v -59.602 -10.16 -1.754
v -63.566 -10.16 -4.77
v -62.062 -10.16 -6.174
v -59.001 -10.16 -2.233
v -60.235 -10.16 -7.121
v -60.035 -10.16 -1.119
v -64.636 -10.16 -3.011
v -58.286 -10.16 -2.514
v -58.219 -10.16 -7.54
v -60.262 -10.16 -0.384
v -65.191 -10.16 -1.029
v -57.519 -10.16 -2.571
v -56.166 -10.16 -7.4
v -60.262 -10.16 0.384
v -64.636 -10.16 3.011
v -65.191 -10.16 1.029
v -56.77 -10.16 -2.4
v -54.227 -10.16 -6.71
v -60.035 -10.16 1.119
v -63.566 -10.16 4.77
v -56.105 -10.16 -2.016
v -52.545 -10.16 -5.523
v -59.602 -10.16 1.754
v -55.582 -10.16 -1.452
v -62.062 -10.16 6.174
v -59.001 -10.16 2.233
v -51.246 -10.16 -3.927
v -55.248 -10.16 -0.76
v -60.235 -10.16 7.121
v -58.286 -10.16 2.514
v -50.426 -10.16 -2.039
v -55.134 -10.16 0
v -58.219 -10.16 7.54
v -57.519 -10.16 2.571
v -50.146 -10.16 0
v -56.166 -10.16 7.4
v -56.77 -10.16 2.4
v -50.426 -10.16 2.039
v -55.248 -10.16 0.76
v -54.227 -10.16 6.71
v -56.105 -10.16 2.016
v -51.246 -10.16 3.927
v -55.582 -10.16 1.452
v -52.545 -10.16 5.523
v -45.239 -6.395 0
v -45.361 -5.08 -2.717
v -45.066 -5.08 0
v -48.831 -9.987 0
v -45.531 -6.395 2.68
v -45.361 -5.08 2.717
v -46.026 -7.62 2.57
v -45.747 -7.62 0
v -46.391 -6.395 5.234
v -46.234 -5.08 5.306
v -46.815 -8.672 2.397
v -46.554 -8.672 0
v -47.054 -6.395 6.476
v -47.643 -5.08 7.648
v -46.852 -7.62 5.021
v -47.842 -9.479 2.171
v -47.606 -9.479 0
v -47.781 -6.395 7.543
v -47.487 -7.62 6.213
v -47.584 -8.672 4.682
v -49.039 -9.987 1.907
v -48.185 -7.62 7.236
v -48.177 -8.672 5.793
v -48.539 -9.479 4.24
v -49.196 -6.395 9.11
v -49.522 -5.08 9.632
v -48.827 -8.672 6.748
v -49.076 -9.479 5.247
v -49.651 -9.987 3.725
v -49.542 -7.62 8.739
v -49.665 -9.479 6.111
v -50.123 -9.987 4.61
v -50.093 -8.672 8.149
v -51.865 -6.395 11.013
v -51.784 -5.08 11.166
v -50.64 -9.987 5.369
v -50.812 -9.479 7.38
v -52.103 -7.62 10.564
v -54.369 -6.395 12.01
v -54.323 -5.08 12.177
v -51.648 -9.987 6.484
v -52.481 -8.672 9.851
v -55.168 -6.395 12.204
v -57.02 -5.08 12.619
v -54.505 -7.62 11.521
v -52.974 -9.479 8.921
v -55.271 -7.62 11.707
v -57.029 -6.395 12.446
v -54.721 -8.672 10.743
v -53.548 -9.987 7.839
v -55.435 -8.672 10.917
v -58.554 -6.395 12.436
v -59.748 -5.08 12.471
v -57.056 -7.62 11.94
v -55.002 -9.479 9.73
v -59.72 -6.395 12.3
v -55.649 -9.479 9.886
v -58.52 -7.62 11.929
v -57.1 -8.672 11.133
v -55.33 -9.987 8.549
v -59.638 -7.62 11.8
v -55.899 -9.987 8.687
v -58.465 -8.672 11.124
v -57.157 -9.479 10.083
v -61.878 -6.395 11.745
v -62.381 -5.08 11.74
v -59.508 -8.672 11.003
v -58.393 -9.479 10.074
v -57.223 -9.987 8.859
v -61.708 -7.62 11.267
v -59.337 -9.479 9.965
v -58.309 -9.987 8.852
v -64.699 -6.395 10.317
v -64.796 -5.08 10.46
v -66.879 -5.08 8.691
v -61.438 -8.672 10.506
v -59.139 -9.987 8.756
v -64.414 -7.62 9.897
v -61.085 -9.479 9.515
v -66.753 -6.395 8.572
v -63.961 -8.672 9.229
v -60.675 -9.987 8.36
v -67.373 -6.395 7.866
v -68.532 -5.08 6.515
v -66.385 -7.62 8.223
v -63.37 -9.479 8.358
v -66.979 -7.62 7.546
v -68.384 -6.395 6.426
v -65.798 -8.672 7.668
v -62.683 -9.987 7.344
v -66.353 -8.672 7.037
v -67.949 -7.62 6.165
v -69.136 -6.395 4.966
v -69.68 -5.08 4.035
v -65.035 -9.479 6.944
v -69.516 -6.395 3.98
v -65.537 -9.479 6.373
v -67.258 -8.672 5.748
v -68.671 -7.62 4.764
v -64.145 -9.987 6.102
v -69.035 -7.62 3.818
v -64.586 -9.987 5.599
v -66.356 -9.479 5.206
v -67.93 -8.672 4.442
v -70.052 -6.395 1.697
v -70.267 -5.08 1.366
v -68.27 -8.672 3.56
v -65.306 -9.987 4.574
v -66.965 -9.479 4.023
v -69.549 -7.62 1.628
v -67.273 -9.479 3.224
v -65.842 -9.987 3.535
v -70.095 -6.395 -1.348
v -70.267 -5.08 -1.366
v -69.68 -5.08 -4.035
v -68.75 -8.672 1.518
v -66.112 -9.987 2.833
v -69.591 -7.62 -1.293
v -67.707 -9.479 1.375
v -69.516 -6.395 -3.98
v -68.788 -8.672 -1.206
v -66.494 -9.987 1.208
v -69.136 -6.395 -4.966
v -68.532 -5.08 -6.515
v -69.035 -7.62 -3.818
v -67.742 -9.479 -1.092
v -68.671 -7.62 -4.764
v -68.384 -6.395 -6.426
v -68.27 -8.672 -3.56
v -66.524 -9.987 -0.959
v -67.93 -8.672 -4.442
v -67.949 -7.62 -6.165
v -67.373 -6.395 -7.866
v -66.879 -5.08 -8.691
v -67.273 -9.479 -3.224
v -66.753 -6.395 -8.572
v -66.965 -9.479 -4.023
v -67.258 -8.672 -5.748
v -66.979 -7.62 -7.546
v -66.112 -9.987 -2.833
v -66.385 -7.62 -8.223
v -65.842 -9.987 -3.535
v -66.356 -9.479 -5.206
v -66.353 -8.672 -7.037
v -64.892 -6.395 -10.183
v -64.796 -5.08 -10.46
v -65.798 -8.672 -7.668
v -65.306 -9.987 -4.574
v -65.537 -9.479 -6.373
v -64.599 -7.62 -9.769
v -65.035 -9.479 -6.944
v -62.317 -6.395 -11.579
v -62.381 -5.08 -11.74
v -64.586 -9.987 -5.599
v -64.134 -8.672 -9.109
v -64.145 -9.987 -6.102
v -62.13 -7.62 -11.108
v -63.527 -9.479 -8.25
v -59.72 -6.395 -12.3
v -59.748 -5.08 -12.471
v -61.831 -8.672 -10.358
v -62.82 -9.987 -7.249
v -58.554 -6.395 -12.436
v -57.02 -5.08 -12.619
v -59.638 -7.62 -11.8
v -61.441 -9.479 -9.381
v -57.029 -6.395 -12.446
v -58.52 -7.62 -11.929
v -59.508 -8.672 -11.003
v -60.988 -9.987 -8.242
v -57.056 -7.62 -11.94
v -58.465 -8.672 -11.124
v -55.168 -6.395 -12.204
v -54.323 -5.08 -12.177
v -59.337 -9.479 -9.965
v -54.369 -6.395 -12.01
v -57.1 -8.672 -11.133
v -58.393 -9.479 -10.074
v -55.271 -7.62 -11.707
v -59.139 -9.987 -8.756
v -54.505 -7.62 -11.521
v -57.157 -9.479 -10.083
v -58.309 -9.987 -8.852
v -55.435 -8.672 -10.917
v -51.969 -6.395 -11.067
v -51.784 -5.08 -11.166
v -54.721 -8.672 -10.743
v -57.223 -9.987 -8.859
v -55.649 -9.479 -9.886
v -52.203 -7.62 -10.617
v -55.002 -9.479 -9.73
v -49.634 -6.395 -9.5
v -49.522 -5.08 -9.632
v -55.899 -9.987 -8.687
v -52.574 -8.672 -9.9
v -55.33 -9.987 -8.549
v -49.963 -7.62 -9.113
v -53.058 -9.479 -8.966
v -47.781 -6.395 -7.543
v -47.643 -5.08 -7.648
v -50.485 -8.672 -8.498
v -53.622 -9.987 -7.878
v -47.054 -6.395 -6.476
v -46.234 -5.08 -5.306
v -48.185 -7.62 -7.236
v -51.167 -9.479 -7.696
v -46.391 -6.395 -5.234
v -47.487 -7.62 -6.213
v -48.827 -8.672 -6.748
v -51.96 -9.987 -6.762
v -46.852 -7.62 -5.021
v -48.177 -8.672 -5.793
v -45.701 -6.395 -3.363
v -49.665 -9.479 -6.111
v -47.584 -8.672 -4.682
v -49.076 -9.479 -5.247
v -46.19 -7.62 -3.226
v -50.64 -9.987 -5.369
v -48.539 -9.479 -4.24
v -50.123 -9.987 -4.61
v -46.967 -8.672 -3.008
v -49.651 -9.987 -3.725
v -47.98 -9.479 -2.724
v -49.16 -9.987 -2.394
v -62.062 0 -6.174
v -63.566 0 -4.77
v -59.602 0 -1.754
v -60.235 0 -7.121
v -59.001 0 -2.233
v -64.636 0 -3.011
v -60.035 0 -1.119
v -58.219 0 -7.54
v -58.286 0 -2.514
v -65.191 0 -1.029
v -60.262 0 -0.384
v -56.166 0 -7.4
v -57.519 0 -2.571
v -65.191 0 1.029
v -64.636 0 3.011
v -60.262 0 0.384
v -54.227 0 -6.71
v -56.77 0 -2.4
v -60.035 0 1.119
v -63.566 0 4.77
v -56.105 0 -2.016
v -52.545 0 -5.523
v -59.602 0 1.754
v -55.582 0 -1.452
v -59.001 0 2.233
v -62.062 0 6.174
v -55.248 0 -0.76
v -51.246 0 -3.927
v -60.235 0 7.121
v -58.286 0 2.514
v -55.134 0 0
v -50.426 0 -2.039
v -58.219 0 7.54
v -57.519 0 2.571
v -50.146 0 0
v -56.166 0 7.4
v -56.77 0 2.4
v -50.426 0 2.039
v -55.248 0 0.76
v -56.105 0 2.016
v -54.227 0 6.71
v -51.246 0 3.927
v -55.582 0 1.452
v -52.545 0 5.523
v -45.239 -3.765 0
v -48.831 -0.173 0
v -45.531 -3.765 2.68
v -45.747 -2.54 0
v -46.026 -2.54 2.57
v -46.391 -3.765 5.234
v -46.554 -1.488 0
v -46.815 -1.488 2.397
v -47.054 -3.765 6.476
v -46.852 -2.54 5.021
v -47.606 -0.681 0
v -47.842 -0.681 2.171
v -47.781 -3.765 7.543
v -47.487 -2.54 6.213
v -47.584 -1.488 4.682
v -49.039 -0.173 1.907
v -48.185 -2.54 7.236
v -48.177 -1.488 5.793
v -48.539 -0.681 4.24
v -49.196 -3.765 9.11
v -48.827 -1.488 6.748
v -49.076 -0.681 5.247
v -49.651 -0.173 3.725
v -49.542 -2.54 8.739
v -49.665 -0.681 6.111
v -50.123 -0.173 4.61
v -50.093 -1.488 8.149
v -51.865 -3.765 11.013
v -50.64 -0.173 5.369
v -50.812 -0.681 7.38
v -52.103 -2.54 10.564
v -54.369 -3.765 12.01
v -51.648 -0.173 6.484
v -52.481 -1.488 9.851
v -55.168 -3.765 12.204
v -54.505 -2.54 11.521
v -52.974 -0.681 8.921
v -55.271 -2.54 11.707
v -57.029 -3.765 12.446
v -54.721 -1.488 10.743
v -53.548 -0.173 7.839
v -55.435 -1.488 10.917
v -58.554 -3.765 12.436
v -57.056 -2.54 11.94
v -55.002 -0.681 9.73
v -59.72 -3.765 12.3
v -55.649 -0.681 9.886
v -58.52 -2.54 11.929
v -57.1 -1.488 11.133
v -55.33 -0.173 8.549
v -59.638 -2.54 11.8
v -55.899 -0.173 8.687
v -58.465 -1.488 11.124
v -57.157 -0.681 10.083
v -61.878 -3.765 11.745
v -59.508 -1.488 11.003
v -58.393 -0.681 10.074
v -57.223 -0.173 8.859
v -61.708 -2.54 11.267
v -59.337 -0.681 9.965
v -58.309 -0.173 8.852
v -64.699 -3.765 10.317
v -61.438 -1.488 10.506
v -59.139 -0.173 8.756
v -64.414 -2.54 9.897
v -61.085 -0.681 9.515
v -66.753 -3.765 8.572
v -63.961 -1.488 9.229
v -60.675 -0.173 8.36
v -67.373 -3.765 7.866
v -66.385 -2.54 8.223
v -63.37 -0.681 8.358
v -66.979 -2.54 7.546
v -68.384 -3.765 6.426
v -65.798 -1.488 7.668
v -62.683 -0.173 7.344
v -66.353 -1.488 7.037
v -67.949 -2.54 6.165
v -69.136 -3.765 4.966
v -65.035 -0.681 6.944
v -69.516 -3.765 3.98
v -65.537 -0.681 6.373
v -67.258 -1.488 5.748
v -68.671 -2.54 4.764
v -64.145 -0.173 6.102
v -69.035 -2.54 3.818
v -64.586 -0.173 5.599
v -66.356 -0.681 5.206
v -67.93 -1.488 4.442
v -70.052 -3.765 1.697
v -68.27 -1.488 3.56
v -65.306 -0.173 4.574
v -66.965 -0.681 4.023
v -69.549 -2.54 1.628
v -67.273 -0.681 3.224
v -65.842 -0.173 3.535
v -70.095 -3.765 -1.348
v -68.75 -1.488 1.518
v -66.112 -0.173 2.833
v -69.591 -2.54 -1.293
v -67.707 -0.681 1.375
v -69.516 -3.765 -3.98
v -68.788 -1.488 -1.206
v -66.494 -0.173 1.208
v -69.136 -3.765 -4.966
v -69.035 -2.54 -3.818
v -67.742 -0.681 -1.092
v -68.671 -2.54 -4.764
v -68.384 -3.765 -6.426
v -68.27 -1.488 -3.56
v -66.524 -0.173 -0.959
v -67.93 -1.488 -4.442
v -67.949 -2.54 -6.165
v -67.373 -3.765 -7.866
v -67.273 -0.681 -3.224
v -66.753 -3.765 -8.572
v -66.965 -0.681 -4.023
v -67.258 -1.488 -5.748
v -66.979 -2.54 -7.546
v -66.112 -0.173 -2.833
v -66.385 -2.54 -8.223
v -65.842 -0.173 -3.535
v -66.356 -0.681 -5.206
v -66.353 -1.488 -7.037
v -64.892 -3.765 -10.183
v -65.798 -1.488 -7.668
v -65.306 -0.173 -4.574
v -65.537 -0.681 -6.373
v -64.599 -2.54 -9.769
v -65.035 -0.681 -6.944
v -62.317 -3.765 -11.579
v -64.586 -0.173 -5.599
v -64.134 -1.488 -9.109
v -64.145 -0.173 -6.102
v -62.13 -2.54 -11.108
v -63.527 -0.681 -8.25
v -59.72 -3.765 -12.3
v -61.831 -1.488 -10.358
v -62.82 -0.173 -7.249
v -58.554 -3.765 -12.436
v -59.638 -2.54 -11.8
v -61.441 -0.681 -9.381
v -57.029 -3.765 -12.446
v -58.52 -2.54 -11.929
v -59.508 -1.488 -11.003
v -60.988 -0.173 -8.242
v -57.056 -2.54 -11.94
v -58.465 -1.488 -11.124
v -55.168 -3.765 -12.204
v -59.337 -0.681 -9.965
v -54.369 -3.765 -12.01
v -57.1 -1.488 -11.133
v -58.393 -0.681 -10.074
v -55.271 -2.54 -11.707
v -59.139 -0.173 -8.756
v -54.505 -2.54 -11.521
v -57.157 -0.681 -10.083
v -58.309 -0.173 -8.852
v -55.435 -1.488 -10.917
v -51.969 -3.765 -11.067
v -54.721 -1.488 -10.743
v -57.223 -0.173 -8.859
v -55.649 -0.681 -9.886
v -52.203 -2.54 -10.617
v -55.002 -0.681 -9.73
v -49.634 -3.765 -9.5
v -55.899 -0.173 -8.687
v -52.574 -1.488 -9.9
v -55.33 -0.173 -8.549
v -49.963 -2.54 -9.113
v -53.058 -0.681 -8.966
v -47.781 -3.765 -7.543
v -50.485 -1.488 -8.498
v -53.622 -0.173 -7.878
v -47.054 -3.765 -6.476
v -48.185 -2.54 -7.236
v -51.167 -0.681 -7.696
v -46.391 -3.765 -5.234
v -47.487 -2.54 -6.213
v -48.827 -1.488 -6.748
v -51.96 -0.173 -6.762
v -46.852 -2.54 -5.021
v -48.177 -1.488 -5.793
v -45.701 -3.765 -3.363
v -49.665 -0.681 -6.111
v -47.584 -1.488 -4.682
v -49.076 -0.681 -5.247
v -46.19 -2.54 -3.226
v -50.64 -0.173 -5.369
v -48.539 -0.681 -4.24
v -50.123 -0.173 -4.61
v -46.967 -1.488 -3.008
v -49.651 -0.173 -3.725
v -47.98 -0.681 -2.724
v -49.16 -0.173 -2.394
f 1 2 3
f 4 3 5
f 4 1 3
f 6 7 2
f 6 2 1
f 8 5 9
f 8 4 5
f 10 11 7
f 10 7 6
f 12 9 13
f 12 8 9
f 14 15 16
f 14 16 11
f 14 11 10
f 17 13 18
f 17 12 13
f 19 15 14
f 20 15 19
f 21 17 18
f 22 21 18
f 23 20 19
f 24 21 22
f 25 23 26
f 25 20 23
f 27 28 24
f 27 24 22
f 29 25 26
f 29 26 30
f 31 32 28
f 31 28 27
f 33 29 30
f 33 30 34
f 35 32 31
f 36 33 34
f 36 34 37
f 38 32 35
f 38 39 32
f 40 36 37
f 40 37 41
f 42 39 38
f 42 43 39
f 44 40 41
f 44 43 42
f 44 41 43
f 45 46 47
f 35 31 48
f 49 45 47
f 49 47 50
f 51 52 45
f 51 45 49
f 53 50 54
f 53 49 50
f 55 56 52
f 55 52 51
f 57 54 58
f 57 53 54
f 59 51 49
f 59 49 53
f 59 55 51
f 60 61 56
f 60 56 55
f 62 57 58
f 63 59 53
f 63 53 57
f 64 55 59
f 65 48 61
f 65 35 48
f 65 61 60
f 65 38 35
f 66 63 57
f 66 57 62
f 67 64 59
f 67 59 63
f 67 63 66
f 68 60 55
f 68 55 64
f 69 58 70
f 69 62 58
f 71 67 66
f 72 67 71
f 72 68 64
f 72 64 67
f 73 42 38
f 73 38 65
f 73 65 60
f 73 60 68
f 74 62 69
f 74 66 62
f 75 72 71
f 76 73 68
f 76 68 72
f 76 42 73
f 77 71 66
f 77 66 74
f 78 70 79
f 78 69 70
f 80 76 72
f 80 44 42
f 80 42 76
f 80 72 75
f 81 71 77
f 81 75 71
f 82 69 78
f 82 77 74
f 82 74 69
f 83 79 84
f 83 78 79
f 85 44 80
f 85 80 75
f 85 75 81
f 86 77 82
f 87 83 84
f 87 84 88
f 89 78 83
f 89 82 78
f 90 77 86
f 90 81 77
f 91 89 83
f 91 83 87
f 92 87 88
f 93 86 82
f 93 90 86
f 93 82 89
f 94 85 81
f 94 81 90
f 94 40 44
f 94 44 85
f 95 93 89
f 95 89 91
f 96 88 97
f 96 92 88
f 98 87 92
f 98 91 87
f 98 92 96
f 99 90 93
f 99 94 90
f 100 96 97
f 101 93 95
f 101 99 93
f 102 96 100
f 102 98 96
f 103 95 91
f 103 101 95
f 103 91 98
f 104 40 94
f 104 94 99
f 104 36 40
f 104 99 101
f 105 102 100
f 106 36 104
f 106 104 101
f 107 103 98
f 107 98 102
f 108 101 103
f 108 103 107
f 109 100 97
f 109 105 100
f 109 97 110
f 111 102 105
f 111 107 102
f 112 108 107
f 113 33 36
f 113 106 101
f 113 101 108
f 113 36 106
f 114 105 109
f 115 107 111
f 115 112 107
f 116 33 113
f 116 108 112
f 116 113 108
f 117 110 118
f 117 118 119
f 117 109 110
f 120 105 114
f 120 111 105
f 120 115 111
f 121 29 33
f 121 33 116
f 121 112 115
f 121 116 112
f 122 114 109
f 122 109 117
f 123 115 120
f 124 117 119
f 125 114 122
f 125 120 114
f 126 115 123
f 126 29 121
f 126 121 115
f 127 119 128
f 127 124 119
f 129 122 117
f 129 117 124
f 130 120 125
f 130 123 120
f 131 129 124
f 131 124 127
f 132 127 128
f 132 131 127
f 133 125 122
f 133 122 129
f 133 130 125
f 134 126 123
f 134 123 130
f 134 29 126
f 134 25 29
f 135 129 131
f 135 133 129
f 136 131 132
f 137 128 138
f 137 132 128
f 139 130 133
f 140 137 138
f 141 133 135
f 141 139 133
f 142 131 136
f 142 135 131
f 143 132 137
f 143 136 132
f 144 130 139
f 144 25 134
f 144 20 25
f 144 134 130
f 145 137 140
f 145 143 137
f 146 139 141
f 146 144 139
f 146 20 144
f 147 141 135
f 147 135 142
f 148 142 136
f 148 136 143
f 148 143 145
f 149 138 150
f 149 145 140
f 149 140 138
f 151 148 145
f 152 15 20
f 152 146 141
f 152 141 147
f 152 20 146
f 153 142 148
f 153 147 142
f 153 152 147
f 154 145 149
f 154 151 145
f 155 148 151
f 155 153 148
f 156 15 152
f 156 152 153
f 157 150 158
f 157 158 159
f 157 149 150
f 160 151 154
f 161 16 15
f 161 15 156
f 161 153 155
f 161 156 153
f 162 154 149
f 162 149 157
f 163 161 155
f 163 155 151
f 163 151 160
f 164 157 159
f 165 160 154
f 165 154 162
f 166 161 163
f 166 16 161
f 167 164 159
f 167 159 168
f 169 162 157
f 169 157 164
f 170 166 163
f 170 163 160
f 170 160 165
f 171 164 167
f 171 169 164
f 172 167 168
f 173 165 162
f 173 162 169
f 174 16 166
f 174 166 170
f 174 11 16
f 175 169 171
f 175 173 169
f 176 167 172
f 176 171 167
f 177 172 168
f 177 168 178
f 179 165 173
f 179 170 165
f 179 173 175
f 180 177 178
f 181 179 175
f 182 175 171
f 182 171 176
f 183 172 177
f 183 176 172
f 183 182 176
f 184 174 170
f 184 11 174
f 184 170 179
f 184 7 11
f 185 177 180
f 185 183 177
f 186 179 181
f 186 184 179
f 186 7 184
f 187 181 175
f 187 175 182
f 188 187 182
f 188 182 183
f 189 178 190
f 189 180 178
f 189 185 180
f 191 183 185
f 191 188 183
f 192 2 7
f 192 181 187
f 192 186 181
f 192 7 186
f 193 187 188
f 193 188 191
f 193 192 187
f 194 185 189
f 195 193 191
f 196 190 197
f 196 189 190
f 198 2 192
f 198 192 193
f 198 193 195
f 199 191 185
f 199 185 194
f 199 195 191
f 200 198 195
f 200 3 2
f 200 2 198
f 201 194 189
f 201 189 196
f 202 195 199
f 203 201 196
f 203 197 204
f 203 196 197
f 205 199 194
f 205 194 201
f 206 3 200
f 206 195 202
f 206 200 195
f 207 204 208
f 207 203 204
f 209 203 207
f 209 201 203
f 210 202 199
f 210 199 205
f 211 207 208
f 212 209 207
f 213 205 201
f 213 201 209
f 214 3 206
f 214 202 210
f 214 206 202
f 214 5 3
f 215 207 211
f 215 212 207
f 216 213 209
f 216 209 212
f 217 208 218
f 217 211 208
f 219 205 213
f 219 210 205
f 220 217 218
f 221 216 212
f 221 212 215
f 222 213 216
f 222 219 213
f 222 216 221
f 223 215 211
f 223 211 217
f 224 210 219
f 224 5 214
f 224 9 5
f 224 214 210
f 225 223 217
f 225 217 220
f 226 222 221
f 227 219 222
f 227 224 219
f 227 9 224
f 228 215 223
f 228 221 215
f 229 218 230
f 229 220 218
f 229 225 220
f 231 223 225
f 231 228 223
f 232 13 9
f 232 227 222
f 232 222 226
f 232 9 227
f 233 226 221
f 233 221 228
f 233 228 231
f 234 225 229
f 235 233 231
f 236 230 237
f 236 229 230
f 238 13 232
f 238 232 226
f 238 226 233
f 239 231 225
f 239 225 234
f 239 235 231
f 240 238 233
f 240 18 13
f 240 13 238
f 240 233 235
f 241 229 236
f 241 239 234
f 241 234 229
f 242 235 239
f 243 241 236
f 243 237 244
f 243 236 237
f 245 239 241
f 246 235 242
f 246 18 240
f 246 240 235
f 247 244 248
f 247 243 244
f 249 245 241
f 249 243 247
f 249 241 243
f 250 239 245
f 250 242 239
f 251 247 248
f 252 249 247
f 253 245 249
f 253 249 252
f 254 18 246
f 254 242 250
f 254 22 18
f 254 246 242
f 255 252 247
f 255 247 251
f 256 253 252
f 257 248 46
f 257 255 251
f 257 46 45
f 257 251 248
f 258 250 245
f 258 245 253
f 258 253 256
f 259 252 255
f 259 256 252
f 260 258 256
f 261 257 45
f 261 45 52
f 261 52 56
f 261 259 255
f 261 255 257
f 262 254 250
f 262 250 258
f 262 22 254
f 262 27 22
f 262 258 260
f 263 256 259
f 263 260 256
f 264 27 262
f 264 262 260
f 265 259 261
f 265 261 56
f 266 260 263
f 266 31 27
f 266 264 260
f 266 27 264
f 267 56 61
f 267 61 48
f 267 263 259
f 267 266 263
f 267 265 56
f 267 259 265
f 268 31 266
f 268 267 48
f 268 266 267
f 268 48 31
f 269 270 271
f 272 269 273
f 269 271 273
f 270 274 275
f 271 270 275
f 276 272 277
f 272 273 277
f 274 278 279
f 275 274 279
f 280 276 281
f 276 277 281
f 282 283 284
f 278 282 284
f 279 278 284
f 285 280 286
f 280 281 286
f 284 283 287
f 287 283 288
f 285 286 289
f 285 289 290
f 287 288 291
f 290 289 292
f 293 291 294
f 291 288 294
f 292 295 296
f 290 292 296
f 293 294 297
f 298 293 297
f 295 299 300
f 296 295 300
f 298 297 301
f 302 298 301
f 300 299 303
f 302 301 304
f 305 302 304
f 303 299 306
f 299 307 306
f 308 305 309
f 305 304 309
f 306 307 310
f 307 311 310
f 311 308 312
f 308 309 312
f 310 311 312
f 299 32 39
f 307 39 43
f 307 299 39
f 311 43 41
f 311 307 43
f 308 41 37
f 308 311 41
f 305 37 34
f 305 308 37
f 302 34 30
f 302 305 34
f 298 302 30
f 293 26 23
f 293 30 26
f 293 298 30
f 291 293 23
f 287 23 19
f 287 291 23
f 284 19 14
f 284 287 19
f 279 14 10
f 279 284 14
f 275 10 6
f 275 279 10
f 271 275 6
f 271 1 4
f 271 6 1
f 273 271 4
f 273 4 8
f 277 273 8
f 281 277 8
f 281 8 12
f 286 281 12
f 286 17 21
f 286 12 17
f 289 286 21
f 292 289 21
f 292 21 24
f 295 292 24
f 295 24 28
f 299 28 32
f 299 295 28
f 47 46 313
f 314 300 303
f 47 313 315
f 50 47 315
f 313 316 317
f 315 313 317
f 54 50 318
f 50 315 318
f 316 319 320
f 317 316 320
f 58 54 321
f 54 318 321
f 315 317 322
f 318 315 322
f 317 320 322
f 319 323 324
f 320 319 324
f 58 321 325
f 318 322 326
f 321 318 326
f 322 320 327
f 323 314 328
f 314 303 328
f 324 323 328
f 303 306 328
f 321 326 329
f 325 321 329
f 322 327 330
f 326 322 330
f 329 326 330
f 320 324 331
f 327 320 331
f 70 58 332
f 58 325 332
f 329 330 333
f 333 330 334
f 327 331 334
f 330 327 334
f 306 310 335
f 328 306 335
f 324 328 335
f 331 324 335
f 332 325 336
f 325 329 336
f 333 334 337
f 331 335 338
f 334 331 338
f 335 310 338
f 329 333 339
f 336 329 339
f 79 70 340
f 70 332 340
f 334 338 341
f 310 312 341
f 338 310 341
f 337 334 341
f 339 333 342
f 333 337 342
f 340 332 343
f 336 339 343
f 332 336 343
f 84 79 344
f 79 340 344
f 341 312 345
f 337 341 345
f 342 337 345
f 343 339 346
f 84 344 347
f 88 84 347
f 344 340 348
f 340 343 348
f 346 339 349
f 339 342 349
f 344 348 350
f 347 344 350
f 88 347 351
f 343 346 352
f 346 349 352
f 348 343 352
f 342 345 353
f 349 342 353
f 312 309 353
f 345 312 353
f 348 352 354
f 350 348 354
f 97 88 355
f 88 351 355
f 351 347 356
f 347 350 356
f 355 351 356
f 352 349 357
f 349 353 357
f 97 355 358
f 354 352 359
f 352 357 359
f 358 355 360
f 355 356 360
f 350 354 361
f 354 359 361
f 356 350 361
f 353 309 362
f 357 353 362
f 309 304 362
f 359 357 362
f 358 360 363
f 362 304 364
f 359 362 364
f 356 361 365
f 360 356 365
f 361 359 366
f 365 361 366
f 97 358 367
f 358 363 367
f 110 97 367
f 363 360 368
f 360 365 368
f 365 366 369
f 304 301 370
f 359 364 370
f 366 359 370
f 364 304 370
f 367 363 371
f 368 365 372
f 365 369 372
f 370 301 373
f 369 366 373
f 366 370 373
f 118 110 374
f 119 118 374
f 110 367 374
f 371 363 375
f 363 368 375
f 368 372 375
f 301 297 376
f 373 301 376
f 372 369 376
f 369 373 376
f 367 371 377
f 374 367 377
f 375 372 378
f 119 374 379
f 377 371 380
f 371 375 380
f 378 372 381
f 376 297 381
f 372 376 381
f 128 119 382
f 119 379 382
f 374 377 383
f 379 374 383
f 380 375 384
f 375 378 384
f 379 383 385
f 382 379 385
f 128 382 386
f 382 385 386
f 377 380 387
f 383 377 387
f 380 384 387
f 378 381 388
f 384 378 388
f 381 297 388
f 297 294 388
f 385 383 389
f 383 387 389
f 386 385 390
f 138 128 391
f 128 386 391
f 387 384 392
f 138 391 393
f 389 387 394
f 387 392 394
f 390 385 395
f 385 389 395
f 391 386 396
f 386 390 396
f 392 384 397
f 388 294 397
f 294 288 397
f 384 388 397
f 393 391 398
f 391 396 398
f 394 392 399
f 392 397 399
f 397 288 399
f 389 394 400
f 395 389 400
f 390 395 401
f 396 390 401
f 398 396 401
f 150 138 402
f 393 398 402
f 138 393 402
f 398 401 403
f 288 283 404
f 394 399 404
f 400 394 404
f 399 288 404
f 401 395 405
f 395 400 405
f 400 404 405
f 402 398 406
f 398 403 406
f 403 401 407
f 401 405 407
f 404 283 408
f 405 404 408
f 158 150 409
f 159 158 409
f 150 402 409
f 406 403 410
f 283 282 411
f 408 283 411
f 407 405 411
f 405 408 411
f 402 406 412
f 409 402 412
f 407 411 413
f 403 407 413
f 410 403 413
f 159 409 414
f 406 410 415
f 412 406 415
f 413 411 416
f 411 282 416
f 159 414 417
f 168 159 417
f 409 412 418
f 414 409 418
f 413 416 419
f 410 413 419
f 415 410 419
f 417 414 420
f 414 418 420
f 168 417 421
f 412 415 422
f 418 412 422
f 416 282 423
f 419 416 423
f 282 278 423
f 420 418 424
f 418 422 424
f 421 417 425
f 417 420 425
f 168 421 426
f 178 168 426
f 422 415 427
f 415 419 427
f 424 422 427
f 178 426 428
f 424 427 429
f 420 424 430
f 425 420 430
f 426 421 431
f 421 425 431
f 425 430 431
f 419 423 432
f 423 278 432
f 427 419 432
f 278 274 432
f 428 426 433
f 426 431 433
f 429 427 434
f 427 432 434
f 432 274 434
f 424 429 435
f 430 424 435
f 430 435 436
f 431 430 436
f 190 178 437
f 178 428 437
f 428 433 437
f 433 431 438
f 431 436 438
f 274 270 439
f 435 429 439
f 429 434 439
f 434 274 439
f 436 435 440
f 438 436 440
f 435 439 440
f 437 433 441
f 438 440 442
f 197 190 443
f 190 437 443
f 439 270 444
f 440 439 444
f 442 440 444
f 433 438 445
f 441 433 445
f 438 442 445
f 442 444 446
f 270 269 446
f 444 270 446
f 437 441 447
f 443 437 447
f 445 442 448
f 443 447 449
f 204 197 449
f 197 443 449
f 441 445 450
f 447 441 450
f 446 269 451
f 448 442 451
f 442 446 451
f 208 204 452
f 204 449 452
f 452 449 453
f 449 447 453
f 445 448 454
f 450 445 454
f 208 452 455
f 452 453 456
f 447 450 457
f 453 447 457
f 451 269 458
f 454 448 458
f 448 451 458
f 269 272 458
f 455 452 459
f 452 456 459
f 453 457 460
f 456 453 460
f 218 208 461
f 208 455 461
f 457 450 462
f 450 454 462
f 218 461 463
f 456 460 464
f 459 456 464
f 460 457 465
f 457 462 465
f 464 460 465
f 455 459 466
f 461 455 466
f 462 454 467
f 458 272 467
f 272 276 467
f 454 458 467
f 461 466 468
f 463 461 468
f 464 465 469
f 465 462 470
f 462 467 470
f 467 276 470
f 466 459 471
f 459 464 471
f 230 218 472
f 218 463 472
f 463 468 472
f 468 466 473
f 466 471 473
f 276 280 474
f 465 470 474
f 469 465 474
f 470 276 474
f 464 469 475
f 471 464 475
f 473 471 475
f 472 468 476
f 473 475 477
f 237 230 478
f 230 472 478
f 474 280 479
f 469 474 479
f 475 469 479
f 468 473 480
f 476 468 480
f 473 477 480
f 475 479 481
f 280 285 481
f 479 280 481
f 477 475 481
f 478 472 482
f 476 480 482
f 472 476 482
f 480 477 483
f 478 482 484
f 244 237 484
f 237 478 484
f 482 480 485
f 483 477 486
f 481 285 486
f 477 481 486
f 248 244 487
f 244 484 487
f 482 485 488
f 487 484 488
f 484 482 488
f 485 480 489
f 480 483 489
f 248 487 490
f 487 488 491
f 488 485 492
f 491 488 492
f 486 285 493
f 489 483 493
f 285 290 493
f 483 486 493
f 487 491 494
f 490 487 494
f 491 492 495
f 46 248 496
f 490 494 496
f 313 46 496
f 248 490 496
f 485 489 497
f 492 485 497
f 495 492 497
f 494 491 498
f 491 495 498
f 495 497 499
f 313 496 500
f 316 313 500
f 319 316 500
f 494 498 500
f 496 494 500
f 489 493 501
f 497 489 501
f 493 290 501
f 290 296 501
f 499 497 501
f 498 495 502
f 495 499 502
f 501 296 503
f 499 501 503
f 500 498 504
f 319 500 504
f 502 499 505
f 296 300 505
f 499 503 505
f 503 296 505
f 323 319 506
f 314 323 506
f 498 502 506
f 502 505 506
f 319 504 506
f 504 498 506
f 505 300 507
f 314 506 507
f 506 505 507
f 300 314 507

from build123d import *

# Parameters (mm, degrees)
F0_R     = 12.6376963258
F1_DEPTH = 10.16
F2_R     = 5.07999
F3_R     = 2.5783631355
F4_DEPTH = 25.4


# Not quite as in the source:
# - a fillet or chamfer is up to 0.001 mm smaller than in the source, because OpenCascade refuses the exact size


with BuildPart() as f1:
    # F0 (on Front) → F1 (new body)
    with BuildSketch(Plane.XZ):
        with Locations((-57.7037265382, 0)):
            Circle(F0_R)
    extrude(amount=F1_DEPTH)

    # F2 (radius 5.08 in the source; OpenCascade refuses exactly that, so slightly less here)
    f2_edges = [f1.edges().sort_by_distance(p)[0] for p in [
        (-70.341423, 0, 0),
        (-70.341423, -10.16, 0),
    ]]
    fillet(f2_edges, radius=F2_R)

    # F3 (on Front) → F4 (cut)
    with BuildSketch(Plane.XZ):
        with Locations((-57.7121302485, 0)):
            Circle(F3_R)
    extrude(amount=F4_DEPTH, mode=Mode.SUBTRACT)


solid = f1.part
